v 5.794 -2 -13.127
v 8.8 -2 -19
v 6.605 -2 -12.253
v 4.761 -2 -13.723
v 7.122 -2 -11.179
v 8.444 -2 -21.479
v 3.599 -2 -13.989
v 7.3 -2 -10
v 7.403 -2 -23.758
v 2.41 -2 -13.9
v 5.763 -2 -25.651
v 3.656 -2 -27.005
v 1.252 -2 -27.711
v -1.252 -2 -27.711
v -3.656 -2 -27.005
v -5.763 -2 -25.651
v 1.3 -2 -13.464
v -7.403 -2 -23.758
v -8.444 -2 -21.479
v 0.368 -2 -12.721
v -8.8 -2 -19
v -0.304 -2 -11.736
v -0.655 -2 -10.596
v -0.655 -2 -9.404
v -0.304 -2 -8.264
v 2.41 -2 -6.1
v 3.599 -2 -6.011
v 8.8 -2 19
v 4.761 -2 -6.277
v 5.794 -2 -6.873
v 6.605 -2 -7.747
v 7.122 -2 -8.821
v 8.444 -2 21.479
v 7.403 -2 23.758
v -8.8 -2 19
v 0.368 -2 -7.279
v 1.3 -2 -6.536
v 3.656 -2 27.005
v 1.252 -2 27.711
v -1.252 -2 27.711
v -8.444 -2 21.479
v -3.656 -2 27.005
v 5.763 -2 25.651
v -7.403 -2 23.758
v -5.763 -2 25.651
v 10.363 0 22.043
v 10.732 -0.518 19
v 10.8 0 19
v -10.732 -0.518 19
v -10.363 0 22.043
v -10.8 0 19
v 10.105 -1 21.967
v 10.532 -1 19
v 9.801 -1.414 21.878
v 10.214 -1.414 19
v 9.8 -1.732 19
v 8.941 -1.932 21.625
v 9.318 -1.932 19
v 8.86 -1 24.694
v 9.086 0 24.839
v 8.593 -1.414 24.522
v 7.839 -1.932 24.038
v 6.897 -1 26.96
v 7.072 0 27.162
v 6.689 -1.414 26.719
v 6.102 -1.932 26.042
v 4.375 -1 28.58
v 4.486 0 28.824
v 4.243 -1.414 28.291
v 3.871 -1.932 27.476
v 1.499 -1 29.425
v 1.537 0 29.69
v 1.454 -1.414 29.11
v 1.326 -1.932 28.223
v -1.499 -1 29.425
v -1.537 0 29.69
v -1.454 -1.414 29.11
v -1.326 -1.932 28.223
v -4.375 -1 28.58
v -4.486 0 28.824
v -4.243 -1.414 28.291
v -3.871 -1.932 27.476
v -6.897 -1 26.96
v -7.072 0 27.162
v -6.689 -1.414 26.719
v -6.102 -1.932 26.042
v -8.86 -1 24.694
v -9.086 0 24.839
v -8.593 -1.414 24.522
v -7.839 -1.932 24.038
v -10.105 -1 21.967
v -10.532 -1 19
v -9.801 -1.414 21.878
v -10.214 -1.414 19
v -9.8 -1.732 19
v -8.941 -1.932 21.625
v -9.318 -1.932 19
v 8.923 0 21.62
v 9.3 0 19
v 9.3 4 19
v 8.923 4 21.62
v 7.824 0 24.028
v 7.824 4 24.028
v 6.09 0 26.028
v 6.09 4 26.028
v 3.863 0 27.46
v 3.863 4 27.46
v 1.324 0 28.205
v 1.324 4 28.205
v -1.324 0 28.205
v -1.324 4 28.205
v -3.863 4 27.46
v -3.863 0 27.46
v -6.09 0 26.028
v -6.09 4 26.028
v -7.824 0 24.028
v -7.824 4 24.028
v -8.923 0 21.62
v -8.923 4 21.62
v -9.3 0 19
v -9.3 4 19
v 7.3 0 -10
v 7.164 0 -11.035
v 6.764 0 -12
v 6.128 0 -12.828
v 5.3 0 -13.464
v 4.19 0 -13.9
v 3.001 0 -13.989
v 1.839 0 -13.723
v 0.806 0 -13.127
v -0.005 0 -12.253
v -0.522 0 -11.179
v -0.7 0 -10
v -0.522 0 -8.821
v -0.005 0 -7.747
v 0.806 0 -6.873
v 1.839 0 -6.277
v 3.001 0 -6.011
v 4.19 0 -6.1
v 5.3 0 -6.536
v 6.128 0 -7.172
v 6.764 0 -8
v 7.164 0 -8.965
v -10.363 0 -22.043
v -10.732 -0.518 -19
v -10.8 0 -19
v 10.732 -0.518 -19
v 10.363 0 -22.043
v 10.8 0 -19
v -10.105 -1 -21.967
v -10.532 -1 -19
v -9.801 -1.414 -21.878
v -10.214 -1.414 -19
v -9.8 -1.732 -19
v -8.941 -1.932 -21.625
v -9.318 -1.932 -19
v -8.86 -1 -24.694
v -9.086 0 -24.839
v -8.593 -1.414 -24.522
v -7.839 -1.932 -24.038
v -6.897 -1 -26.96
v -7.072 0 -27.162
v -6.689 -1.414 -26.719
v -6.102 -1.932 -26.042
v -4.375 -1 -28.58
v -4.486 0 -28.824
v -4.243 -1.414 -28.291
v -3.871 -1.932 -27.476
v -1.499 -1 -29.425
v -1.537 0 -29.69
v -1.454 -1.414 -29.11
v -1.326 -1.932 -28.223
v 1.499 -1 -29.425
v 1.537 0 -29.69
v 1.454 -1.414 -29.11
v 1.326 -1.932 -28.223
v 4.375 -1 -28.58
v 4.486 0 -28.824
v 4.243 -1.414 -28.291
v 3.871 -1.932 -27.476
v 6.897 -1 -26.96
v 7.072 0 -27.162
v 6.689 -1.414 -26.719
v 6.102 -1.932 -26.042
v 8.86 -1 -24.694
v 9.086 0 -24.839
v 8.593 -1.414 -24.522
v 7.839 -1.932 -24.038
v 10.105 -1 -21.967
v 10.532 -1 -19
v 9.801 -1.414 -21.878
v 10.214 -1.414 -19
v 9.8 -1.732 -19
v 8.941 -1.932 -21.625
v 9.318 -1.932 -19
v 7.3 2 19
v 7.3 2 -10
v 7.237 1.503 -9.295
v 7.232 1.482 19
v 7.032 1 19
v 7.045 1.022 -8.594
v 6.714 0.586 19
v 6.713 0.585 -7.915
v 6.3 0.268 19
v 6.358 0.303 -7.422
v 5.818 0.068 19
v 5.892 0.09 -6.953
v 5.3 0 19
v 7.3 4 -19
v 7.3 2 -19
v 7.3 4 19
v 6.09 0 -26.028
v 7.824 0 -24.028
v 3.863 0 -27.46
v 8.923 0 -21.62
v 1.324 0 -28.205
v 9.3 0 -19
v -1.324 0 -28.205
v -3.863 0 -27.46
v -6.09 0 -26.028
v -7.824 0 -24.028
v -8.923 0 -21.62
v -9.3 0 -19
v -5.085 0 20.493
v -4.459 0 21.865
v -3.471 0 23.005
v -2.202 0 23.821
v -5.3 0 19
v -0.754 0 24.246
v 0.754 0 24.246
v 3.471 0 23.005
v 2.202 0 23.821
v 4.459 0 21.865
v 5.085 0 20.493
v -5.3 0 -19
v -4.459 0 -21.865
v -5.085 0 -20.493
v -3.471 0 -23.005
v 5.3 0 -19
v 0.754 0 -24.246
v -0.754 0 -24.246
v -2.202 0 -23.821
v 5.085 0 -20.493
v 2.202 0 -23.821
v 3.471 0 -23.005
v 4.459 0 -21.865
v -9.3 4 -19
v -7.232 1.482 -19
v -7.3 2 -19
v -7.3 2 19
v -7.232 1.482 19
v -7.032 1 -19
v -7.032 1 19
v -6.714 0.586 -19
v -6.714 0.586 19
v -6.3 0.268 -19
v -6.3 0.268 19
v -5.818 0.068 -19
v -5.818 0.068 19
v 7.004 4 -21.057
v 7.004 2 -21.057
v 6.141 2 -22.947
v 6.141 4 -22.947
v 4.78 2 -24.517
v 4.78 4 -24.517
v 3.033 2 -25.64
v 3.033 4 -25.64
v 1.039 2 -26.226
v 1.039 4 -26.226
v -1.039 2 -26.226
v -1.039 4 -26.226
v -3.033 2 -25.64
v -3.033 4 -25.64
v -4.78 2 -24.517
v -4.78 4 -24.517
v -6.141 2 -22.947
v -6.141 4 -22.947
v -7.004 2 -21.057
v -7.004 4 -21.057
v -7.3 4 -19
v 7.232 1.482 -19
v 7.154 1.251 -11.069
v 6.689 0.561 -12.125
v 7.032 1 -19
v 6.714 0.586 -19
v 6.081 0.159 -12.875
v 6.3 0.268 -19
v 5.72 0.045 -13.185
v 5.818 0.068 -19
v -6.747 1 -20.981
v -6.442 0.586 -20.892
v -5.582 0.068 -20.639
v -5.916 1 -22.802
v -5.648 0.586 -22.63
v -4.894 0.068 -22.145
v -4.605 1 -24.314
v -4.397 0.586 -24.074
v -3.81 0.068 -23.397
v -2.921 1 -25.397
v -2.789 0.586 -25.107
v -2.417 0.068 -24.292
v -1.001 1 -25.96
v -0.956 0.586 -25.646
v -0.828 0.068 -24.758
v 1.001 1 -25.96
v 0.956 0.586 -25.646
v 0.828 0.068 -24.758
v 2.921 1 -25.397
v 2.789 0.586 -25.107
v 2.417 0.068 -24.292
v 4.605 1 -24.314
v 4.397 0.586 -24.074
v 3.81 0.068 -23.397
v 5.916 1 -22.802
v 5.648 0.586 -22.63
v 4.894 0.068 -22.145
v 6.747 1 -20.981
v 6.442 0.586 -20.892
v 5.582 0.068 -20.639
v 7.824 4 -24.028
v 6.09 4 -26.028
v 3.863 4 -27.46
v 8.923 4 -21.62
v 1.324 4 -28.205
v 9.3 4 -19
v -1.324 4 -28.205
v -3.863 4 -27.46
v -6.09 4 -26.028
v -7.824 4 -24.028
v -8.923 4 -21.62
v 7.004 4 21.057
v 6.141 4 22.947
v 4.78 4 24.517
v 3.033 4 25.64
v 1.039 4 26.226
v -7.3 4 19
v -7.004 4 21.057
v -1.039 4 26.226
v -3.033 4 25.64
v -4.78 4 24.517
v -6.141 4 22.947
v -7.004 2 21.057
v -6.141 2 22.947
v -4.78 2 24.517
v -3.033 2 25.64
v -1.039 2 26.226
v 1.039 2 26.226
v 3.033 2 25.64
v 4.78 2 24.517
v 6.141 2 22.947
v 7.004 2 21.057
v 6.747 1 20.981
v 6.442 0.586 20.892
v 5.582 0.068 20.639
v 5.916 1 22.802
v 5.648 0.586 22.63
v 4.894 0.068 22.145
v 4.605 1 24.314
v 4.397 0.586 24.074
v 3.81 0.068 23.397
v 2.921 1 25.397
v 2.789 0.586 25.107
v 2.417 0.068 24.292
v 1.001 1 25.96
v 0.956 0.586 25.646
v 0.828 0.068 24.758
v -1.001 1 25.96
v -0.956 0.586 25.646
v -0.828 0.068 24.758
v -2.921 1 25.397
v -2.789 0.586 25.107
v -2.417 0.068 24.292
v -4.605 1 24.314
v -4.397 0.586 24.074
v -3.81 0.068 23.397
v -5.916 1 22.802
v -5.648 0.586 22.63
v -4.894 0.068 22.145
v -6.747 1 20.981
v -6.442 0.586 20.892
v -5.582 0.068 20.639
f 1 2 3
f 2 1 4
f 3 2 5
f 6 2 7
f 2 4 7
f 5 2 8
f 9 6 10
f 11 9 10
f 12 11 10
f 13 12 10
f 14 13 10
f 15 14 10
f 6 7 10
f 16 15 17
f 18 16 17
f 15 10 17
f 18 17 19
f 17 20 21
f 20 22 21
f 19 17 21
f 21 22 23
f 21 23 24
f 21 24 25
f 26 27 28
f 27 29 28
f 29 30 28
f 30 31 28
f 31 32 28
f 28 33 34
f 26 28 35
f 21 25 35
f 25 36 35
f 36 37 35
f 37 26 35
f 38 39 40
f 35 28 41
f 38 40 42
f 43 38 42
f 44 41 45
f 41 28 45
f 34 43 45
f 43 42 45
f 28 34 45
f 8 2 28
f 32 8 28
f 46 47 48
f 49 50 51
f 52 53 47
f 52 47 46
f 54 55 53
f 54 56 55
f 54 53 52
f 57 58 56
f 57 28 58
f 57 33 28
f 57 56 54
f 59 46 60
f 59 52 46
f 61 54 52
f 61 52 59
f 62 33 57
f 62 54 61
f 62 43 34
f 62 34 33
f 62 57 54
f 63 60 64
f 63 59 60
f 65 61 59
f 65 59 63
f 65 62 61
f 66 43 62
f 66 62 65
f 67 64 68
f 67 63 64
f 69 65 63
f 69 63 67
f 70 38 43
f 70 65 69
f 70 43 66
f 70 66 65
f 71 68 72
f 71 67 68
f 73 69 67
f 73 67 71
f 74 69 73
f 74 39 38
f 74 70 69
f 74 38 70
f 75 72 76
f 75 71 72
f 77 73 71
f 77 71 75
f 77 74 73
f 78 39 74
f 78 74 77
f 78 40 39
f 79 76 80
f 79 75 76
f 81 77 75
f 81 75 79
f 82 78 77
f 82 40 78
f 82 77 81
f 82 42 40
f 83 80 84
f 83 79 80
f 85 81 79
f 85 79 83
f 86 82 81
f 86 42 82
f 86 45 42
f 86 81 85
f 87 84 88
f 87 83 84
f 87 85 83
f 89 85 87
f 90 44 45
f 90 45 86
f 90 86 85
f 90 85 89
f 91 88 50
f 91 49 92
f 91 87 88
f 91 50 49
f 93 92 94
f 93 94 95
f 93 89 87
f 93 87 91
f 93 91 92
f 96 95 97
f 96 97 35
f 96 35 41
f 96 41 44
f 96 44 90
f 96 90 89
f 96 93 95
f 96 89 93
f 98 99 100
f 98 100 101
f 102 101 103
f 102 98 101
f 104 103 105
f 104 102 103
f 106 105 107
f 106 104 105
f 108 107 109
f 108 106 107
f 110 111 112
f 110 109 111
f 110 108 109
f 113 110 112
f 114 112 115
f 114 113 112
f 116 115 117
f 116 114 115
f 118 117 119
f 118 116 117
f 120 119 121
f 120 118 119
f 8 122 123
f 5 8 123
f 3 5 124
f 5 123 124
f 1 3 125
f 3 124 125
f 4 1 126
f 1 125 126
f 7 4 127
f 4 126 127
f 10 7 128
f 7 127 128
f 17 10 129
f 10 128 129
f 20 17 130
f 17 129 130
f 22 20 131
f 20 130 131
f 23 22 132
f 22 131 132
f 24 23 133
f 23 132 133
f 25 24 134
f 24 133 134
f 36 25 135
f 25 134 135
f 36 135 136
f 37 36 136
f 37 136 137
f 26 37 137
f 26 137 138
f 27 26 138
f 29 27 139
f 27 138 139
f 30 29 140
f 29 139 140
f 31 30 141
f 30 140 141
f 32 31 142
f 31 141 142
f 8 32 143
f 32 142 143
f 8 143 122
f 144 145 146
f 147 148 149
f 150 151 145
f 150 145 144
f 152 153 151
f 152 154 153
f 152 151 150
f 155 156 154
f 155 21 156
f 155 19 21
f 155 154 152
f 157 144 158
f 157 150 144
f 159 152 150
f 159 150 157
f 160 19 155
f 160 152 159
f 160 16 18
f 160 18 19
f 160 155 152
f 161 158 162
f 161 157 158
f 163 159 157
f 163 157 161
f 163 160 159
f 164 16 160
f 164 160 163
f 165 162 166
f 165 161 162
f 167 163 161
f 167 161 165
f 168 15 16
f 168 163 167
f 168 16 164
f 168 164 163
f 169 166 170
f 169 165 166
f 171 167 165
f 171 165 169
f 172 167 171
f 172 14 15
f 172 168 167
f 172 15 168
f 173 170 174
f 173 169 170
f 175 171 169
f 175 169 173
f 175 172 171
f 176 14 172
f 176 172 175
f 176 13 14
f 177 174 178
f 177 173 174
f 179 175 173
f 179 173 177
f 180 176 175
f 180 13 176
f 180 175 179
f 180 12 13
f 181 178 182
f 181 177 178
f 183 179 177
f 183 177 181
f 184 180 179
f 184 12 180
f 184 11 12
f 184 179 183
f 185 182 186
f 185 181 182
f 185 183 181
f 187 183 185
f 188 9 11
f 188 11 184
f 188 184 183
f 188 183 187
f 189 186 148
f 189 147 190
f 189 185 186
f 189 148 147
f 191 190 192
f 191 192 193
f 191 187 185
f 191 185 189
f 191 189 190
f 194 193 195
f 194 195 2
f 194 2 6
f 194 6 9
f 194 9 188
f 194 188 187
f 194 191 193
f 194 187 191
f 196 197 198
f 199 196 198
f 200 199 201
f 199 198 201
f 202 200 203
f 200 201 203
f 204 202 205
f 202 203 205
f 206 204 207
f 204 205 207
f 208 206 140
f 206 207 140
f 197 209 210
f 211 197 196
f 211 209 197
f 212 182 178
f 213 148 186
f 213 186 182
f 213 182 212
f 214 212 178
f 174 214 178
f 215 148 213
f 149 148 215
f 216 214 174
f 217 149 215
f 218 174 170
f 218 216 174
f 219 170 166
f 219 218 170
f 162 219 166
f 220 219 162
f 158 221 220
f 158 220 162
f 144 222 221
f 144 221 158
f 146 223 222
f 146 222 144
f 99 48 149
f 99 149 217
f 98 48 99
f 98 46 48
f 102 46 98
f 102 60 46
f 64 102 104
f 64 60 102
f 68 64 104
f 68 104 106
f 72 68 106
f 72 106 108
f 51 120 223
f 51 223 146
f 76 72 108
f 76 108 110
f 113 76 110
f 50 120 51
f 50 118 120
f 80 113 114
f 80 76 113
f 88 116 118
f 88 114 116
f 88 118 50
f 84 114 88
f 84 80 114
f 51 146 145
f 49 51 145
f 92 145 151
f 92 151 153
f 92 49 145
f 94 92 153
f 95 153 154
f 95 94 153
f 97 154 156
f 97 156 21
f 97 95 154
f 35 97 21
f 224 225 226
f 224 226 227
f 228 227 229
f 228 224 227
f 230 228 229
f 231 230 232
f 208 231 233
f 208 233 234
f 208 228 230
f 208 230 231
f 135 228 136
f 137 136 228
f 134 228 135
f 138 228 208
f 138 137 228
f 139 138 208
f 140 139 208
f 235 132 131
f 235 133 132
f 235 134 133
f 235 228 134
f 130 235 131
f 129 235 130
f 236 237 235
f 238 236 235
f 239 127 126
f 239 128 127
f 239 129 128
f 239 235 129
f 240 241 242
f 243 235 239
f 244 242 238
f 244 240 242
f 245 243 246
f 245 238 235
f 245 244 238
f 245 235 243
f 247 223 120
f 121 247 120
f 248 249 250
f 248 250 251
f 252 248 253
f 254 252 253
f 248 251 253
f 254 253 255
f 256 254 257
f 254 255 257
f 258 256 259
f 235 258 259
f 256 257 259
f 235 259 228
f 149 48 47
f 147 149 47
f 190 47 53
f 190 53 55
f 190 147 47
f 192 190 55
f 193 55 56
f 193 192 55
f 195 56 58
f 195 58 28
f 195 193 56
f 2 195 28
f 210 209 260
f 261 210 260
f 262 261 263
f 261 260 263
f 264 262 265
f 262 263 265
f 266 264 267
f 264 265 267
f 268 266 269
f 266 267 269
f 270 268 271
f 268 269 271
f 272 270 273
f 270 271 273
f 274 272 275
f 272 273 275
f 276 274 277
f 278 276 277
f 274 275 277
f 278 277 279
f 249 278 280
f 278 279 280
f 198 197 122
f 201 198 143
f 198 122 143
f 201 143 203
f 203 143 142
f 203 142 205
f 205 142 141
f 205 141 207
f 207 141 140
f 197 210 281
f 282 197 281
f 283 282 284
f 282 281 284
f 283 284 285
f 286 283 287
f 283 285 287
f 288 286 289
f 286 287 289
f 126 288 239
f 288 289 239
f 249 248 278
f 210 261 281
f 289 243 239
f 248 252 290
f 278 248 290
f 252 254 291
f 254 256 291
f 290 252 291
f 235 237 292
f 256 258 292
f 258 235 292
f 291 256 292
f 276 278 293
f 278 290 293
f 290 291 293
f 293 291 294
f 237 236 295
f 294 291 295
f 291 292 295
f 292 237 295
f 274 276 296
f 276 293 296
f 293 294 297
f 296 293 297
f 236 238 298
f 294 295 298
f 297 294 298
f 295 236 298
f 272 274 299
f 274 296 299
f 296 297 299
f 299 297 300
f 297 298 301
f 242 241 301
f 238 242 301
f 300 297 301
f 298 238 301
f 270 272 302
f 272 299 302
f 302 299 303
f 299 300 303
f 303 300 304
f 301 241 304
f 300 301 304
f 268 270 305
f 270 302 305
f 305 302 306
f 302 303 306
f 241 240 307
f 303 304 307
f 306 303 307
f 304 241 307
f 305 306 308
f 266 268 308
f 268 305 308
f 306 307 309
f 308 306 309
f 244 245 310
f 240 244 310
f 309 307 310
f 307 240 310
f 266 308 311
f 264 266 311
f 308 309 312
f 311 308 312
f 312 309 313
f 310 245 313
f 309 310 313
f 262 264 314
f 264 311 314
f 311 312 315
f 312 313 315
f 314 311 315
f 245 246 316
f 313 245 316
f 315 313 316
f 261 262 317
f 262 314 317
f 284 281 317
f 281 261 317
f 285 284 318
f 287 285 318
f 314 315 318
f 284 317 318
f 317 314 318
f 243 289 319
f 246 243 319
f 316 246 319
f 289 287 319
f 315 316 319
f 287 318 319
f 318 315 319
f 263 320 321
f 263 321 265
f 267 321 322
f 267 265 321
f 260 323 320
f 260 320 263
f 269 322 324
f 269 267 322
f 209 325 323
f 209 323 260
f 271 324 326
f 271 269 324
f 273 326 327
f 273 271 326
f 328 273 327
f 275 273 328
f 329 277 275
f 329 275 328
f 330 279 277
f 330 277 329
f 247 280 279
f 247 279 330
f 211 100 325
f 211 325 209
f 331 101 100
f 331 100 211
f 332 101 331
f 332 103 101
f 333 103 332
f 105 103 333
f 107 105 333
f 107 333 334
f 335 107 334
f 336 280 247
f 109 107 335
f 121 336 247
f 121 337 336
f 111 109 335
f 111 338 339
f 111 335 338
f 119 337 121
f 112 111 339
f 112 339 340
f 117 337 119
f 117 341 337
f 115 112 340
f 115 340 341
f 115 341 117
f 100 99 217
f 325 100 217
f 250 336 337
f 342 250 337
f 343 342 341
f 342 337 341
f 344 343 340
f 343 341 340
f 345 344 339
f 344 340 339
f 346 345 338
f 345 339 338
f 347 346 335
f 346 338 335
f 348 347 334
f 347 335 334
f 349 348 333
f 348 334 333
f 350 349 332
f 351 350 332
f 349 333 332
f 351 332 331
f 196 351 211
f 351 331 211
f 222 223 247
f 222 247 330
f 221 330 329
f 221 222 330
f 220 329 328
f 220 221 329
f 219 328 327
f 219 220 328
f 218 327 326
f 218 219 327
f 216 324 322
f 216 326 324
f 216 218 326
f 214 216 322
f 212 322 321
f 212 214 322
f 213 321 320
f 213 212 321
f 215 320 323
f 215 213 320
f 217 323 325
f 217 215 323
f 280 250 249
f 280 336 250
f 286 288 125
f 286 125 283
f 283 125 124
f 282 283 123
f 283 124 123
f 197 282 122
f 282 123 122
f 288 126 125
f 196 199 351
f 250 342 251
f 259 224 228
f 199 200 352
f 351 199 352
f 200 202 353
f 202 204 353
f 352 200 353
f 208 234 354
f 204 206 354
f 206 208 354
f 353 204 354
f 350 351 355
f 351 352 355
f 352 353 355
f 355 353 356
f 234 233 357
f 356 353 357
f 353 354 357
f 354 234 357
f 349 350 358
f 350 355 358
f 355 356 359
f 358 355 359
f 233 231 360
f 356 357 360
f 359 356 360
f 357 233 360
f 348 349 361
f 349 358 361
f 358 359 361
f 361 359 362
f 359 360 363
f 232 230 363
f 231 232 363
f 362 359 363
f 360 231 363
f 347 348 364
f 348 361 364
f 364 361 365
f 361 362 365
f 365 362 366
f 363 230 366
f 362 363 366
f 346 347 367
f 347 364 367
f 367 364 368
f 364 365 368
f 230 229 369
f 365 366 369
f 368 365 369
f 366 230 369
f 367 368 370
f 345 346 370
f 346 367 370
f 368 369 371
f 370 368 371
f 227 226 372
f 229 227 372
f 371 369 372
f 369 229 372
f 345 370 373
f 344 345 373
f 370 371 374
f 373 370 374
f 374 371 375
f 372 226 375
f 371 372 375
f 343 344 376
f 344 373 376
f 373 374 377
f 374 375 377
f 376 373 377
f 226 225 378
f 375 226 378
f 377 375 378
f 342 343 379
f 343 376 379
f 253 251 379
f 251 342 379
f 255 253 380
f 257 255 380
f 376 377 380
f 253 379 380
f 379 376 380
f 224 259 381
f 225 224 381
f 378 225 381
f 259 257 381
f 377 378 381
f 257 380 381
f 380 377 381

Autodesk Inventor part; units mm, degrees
ref_plane "YZ Plane" through (0, 0, 0) normal (1, 0, 0) x (0, 1, 0)
ref_plane "XZ Plane" through (0, 0, 0) normal (0, 1, 0) x (-1, 0, 0)
ref_plane "XY Plane" through (0, 0, 0) normal (0, 0, 1) x (1, 0, 0)
sketch "Skizze1" plane through (0, 0, 0) normal (0, 1, 0) x (-1, 0, 0)
  line L0 (0, 19) -> (0, -19) construction
  line L1 (-9.3, 19) -> (-9.3, -19)
  line L2 (9.3, -19) -> (9.3, 19)
  arc A0 (9.3, 19) -> (-9.3, 19) centre (0, 19) ccw
  arc A1 (-9.3, -19) -> (9.3, -19) centre (0, -19) ccw
  line L3 (0, 19) -> (0, -19) construction
  line L4 (-10.8, 19) -> (-10.8, -19)
  line L5 (10.8, -19) -> (10.8, 19)
  arc A2 (10.8, 19) -> (-10.8, 19) centre (0, 19) ccw
  arc A3 (-10.8, -19) -> (10.8, -19) centre (0, -19) ccw
  point P0 (0, 0)
  dimension "d0" = 19
  dimension "d1" = 18.6
  dimension "d2" = 1.5
extrude "Extrusion1" add sketch "Skizze1" along normal blind 4 contours A0 L2 A1 L1
extrude "Extrusion2" add sketch "Skizze1" against normal blind 2 contours A0 L2 A1 L1 | A2 L5 A3 L4
fillet "Rundung1" radius 2 4 edges at (-10.8, -2, 0) (0, -2, -29.8) (10.8, -2, 0) (0, -2, 29.8)
sketch "Skizze2" plane through (0, 4, 0) normal (0, 1, 0) x (1, 0, 0)
  line L0 (0, -19) -> (0, 19) construction
  line L1 (-7.3, -19) -> (-7.3, 19)
  line L2 (7.3, 19) -> (7.3, -19)
  arc A0 (-7.3, -19) -> (7.3, -19) centre (0, -19) ccw
  arc A1 (7.3, 19) -> (-7.3, 19) centre (0, 19) ccw
  arc A2 (9.3, 19) -> (-9.3, 19) centre (0, 19) ccw projected
  line L3 (9.3, -19) -> (9.3, 19) projected
  point P0 (0, 0)
  dimension "d8" = 2
extrude "Extrusion3" cut sketch "Skizze2" against normal blind 4
fillet "Rundung2" radius 2 4 edges at (0, 0, 26.3) (-7.3, 0, 0) (0, 0, -26.3) (7.3, 0, 0)
sketch "Skizze3" plane through (0, 0, 0) normal (0, 1, 0) x (1, 0, 0)
  circle A0 centre (3.3, 10) radius 4
  line L0 (7.3, 19) -> (7.3, -19) projected
  point P0 (0, 0)
  dimension "d12" = 8
  dimension "d13" = 10
extrude "Extrusion4" cut sketch "Skizze3" along normal mid plane 4
equation "\"G_L\" = 0"
equation "\"G_H\" = 0"
equation "\"G_B\" = 0"
properties part number "Batterycase_deckel" material "GEDA Stahl"
